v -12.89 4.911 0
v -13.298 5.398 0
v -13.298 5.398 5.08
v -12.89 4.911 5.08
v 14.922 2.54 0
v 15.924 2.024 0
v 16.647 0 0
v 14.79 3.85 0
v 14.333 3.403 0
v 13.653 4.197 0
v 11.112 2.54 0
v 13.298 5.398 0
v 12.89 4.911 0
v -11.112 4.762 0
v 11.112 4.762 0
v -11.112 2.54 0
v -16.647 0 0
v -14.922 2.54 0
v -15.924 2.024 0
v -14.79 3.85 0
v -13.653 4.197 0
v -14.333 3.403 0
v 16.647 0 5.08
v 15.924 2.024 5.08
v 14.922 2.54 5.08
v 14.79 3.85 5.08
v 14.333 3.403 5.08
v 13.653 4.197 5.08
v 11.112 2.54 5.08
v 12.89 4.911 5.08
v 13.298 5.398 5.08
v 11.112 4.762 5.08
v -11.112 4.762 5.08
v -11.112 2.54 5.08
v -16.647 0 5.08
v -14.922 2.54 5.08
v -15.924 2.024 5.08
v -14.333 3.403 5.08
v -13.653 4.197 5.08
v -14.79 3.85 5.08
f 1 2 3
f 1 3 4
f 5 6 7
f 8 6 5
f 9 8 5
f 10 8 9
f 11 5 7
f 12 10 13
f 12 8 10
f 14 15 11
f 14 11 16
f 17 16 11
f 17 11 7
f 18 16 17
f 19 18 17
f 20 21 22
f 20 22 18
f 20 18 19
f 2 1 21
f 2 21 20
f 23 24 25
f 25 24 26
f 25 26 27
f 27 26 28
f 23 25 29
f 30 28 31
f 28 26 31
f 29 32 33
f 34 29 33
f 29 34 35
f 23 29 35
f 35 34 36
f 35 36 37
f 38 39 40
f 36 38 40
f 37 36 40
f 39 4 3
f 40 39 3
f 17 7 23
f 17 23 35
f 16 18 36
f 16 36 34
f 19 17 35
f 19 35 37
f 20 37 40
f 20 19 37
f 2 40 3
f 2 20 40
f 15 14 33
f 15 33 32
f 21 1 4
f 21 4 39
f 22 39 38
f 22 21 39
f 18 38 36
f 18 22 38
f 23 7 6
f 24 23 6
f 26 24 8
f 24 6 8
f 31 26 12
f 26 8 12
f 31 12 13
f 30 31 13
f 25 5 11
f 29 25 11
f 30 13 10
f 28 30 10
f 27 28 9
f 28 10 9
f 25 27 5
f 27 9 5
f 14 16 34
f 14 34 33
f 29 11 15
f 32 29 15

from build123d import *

# Parameters (mm, degrees)
F1_DEPTH = 5.08


with BuildPart() as f1:
    # F0 (on Top) → F1 (new body)
    with BuildSketch(Plane.XY):
        with BuildLine():
            Line((0, 4.7625), (0, 0))
            Line((0, 0), (16.647249, 0))
            ThreePointArc((16.647249, 0), (15.405472, 2.967188), (13.298387, 5.3975))
            Line((13.298387, 5.3975), (12.8905, 4.910825))
            ThreePointArc((12.8905, 4.910825), (14.004311, 3.809245), (14.9225, 2.54))
            Line((14.9225, 2.54), (11.1125, 2.54))
            Line((11.1125, 2.54), (11.1125, 4.7625))
            Line((11.1125, 4.7625), (0, 4.7625))
        make_face()
    extrude(amount=F1_DEPTH)

    # F2: F1 across face


with BuildPart() as f1_1:
    add(f1.part)
    add(f1.part.mirror(Plane(origin=(0, 2.38125, 2.54), x_dir=(0, -1, 0), z_dir=(-1, 0, 0))))


solid = f1_1.part
